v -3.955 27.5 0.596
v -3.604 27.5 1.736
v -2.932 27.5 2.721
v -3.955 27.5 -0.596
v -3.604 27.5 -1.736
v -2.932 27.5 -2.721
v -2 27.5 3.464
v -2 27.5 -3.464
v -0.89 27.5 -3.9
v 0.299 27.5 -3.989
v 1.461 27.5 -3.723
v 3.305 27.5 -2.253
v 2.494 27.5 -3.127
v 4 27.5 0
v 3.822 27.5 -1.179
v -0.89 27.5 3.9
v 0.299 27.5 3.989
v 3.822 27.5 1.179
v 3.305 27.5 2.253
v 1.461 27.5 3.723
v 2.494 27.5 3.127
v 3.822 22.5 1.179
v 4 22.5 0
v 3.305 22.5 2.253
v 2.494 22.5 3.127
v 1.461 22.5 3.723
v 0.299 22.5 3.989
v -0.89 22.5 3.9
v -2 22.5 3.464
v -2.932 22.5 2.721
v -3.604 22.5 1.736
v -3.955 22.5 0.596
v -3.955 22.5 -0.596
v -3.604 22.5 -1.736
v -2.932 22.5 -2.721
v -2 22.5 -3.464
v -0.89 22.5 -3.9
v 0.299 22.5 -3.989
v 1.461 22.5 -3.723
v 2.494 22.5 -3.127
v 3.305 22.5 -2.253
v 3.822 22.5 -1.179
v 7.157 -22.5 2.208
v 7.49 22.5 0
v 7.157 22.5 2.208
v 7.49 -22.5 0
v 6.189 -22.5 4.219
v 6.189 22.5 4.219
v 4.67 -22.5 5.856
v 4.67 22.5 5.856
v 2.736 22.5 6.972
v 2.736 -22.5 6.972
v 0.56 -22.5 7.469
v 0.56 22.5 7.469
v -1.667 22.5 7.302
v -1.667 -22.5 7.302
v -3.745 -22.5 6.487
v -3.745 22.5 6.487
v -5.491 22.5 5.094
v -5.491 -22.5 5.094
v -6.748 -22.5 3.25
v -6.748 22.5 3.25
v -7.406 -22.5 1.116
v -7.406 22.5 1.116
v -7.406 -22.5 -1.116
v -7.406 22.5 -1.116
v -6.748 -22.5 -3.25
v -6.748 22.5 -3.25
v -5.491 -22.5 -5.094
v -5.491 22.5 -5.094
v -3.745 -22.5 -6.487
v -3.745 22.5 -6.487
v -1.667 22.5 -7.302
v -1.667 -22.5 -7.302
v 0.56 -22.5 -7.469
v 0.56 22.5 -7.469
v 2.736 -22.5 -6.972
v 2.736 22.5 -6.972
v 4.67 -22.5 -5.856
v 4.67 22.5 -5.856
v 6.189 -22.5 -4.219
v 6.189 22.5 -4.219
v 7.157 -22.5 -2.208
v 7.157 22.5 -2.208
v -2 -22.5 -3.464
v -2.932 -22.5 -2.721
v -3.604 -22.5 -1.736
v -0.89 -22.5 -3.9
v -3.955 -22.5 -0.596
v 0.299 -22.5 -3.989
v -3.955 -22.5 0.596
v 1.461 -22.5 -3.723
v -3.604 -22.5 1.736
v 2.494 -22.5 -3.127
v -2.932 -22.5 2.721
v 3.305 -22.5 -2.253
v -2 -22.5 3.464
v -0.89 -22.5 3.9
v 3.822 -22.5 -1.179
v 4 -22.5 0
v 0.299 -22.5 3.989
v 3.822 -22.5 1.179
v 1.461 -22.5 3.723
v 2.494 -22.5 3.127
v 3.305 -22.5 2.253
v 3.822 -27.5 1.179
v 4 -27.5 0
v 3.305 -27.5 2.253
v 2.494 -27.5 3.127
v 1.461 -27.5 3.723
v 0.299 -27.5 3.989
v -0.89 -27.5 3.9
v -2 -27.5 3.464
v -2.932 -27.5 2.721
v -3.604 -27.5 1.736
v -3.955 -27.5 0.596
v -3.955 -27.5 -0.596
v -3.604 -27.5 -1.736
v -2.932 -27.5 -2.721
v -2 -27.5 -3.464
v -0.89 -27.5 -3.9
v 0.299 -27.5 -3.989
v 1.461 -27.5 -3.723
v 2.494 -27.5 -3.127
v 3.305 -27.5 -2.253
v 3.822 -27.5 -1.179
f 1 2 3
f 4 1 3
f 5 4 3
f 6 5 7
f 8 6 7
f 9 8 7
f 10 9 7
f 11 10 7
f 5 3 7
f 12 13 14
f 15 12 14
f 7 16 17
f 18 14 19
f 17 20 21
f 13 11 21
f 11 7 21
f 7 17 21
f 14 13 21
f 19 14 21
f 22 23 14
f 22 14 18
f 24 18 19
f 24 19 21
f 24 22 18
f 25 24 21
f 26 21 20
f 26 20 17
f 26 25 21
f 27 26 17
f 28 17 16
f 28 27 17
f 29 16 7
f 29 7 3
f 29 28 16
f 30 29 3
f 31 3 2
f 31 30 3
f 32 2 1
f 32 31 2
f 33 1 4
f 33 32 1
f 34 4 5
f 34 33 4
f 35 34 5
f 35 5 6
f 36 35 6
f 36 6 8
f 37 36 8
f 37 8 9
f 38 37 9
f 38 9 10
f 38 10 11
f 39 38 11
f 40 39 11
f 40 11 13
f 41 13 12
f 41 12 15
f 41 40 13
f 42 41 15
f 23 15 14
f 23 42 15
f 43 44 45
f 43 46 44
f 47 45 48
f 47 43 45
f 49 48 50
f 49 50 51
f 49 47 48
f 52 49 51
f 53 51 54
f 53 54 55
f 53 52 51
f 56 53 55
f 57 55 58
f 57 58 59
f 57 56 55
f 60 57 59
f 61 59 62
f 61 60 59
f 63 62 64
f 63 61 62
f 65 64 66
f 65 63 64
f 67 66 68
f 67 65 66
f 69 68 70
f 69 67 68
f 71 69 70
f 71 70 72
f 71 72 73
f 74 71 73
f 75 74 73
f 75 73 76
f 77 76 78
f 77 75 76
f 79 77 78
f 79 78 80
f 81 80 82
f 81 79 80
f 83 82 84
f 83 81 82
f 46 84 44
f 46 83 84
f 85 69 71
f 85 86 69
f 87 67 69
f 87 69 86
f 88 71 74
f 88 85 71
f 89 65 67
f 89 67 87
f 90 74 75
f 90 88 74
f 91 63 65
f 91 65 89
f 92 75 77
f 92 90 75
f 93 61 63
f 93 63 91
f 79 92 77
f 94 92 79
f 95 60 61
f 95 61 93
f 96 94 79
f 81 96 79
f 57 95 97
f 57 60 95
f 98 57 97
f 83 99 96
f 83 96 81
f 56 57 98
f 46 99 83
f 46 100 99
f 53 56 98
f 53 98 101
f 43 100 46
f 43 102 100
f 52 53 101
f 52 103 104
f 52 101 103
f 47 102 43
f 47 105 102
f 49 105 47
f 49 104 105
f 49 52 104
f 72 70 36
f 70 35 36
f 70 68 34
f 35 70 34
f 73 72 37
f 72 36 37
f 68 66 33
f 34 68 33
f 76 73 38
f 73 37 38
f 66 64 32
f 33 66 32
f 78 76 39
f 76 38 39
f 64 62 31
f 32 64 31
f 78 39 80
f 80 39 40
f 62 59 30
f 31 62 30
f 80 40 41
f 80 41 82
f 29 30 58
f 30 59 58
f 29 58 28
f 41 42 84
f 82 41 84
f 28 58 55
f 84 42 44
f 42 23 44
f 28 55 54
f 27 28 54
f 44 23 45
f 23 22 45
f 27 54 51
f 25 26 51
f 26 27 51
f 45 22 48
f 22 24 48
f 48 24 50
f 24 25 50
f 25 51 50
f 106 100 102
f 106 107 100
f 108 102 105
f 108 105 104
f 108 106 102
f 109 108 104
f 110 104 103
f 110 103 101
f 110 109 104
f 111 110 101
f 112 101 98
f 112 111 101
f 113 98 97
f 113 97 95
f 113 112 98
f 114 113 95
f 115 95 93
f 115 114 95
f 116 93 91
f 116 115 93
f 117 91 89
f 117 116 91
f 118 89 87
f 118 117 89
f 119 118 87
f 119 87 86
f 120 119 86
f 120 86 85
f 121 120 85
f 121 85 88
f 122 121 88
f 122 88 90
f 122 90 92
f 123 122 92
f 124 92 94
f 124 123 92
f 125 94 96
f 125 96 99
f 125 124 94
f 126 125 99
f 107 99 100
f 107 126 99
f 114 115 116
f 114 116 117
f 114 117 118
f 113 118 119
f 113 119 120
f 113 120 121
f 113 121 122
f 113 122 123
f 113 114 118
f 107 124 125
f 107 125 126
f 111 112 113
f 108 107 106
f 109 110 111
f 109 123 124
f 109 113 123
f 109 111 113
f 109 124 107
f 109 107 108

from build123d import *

# Parameters (mm, degrees)
F0_R     = 7.49
F1_DEPTH = 22.5
F2_R     = 4
F3_DEPTH = 27.5


with BuildPart() as f1:
    # F0 (on Front) → F1 (new body, symmetric)
    with BuildSketch(Plane.XZ):
        Circle(F0_R)
    extrude(amount=F1_DEPTH, both=True)

    # F2 (on Front) → F3 (join, symmetric)
    with BuildSketch(Plane.XZ):
        Circle(F2_R)
    extrude(amount=F3_DEPTH, both=True)


solid = f1.part
